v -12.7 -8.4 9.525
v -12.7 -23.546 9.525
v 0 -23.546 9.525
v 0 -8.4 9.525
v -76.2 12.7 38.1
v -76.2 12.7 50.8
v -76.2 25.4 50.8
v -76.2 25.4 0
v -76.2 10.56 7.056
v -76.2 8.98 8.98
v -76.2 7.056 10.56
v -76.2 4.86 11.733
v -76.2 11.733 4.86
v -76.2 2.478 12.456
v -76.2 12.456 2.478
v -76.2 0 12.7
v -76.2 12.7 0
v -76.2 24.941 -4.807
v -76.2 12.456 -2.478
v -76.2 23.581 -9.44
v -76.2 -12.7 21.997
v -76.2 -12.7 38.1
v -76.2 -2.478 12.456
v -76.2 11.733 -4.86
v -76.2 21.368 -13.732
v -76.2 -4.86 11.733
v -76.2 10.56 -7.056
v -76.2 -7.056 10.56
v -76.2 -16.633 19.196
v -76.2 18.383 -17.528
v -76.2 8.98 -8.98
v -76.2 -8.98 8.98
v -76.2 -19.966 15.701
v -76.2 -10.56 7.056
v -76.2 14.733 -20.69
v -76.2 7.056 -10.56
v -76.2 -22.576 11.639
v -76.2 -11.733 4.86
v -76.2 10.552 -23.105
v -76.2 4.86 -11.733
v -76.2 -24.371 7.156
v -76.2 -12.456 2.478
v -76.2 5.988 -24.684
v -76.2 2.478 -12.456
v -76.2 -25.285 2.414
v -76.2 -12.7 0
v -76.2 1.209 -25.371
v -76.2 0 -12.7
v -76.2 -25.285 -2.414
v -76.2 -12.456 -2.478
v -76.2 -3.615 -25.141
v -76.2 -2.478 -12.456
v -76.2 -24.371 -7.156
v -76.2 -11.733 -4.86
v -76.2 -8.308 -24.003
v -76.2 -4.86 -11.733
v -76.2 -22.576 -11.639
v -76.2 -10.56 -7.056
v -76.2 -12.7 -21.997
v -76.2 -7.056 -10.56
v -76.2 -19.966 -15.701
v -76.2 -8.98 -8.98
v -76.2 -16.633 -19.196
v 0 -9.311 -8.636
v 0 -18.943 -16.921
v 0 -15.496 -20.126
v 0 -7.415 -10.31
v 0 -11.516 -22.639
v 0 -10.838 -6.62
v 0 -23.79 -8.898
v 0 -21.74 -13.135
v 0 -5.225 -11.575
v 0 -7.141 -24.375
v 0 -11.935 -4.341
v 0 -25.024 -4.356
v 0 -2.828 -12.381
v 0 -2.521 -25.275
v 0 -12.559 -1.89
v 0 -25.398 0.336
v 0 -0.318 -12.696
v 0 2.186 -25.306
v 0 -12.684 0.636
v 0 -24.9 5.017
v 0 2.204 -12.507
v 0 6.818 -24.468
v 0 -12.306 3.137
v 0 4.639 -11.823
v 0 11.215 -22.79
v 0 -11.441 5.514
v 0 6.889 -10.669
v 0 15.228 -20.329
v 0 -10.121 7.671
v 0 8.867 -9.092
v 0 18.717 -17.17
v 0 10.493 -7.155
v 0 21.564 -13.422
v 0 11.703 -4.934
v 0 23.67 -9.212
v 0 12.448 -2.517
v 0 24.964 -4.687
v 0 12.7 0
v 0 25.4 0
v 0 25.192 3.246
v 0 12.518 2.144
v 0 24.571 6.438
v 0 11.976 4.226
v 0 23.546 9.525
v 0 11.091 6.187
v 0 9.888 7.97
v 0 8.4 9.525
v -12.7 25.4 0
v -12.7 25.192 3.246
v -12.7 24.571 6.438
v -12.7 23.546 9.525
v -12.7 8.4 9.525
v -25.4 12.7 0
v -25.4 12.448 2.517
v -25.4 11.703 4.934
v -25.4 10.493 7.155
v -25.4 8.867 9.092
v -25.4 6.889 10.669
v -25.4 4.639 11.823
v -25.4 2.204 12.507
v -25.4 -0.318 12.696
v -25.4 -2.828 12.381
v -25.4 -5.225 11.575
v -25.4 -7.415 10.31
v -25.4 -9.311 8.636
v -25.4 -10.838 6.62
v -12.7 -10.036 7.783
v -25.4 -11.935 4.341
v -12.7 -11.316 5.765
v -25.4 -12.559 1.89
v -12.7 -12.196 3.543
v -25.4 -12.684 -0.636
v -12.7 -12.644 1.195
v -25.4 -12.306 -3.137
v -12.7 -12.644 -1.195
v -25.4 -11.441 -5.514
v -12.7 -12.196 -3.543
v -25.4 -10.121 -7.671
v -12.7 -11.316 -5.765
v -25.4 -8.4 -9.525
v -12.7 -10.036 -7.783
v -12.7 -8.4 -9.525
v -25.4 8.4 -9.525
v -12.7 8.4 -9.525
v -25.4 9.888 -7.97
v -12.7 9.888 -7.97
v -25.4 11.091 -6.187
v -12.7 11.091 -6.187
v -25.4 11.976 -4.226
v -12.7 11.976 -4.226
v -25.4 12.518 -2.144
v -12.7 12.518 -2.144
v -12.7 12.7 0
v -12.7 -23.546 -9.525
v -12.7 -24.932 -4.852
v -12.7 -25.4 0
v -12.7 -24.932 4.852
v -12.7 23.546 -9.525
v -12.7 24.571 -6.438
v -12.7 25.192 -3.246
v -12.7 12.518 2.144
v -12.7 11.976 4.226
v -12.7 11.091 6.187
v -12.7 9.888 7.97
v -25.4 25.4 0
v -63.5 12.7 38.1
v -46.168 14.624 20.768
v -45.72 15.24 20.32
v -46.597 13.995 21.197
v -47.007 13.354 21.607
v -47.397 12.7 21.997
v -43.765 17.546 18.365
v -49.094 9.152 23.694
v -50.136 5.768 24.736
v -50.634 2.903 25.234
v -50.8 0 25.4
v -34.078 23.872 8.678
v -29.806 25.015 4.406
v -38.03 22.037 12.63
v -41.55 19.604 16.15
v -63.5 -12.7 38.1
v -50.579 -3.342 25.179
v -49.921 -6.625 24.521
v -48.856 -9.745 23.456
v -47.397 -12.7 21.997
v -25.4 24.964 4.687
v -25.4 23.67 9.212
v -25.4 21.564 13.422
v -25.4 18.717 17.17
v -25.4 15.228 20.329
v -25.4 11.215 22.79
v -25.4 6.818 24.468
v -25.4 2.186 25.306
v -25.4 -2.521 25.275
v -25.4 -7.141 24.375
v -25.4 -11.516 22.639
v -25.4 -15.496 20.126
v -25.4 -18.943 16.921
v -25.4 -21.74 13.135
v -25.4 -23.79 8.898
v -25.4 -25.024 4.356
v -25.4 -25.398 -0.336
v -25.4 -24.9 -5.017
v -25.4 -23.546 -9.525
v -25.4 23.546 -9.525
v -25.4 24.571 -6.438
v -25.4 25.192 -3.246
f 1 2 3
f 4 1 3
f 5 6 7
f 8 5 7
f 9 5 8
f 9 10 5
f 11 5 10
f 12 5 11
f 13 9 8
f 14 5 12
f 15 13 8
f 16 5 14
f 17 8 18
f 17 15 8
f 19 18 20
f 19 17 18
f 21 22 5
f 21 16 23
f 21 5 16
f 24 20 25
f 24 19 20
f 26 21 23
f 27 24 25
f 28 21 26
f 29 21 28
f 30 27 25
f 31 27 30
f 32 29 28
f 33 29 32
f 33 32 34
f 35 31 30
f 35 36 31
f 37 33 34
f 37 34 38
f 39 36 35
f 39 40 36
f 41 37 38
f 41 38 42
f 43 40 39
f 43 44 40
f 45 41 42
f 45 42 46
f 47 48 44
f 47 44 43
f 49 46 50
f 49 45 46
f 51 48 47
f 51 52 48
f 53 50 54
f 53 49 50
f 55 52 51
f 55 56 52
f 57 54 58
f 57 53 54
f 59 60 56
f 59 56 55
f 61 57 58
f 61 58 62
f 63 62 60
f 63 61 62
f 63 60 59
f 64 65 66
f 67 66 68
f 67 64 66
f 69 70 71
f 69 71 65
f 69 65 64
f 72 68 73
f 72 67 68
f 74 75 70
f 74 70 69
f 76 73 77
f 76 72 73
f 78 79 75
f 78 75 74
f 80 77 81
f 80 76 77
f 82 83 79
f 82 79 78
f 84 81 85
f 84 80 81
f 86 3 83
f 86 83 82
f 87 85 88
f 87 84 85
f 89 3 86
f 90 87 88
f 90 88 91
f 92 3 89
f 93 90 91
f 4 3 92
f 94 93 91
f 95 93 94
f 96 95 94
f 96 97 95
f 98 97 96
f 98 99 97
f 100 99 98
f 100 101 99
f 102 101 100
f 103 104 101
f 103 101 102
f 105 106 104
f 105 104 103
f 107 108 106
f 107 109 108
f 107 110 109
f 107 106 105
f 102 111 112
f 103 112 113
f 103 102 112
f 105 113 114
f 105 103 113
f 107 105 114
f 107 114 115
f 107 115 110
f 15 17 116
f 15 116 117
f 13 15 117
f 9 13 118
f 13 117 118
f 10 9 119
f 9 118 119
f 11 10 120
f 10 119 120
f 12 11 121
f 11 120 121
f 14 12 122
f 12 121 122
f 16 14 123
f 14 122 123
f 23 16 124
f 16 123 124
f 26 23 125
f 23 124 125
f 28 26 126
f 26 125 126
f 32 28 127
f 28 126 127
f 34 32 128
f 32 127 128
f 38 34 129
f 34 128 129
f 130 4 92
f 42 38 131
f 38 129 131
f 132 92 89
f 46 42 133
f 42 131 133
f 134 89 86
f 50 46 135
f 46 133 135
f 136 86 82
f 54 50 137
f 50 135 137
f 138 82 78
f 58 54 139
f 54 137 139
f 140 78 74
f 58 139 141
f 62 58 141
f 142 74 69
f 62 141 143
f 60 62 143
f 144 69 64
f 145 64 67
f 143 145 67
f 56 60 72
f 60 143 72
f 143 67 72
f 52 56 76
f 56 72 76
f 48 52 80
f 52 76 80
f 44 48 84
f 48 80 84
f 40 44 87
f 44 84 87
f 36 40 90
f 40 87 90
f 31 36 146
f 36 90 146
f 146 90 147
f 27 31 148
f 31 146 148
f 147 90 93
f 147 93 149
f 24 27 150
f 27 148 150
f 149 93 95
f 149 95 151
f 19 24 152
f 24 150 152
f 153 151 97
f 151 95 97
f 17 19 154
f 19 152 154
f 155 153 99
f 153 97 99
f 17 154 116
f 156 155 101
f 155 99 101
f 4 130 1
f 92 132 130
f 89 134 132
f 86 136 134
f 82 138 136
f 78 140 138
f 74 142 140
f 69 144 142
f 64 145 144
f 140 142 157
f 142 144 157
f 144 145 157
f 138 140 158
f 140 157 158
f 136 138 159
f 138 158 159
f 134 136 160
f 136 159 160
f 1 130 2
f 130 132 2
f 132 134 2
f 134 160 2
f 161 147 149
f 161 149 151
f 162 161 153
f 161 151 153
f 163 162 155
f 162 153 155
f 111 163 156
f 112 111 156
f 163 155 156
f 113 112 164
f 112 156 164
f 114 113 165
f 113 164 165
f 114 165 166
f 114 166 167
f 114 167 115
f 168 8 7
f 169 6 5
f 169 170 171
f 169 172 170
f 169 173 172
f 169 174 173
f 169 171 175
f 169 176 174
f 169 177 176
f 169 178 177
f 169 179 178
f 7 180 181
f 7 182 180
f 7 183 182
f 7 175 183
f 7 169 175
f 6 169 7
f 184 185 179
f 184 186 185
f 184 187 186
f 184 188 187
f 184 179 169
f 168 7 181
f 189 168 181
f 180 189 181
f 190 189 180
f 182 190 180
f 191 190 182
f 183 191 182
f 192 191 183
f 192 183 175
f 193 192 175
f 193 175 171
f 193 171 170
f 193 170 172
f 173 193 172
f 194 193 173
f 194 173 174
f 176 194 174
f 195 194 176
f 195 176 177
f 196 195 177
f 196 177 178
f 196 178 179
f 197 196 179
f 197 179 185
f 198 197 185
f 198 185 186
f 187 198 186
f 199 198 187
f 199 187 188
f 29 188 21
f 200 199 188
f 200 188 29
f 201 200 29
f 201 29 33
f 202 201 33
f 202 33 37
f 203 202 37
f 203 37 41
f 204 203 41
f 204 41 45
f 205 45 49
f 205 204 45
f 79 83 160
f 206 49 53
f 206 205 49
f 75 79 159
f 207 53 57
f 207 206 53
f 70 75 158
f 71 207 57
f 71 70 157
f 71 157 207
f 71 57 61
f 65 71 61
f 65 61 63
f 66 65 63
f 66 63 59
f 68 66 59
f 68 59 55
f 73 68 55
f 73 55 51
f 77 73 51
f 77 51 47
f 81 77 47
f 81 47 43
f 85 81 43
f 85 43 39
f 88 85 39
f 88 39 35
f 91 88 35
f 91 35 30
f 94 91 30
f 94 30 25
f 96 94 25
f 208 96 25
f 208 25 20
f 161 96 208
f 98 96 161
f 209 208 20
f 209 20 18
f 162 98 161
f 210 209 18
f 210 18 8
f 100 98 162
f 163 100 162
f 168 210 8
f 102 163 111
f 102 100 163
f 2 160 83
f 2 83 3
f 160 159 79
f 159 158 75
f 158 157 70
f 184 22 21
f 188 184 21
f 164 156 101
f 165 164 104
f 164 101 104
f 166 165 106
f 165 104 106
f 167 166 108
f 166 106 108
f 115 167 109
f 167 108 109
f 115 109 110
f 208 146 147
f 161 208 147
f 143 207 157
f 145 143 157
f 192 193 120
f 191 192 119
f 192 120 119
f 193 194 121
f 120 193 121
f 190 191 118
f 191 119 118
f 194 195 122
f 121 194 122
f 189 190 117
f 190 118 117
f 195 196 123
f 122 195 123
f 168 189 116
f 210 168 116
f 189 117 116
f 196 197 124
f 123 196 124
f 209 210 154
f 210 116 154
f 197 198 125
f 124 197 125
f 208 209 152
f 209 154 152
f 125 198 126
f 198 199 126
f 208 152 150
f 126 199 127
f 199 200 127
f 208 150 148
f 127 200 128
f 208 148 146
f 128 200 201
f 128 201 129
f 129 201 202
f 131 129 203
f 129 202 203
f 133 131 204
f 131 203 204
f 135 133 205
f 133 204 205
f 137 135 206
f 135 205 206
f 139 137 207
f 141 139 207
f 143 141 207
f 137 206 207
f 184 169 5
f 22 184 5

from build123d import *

# Parameters (mm, degrees)
F0_R     = 12.7
F1_DEPTH = 76.2
F3_DEPTH = 50.8
F4_DEPTH = 12.7
F5_DEPTH = 25.4
F6_DEPTH = 12.7
F7_DEPTH = 25.4
F8_DEPTH = 76.2


with BuildPart() as f1:
    # F0 (on Right) → F1 (new body)
    with BuildSketch(Plane.YZ):
        with BuildLine():
            ThreePointArc((-12.7, 21.9970452561), (-12.7, -21.9970452561), (25.4, 0))
            ThreePointArc((25.4, 0), (12.7, 21.9970452561), (-12.7, 21.9970452561))
        make_face()
        Circle(F0_R, mode=Mode.SUBTRACT)
    extrude(amount=-F1_DEPTH)

    # F2 (on Front) → F3 (cut, symmetric)
    with BuildSketch(Plane.XZ):
        Polygon((-12.7, 9.525), (0, 9.525), (0, 25.4), (0, 50.8), (-76.2, 50.8), (-63.5, 38.1), (-50.8, 25.4), (-25.4, 25.4), (-25.4, 0), (-25.4, -9.525), (-12.7, -9.525), align=None)
    extrude(amount=F3_DEPTH, both=True, mode=Mode.SUBTRACT)

    # F2 (on Front) → F4 (join, symmetric)
    with BuildSketch(Plane.XZ):
        Polygon((-76.2, 38.1), (-76.2, 20.32), (-45.72, 20.32), (-50.8, 25.4), (-63.5, 38.1), align=None)
    extrude(amount=F4_DEPTH, both=True)

    # F2 (on Front) → F5 (join)
    with BuildSketch(Plane.XZ):
        Polygon((-76.2, 50.8), (-76.2, 38.1), (-63.5, 38.1), align=None)
        Polygon((-76.2, 38.1), (-76.2, 20.32), (-45.72, 20.32), (-50.8, 25.4), (-63.5, 38.1), align=None)
    extrude(amount=-F5_DEPTH)

    # F6 (cut): a face of the model
    f6_faces = [f1.faces().sort_by_distance(p)[0] for p in [
        (-71.9666666667, 0, 42.3333333333),
    ]]
    extrude(f6_faces, amount=-F6_DEPTH, mode=Mode.SUBTRACT)

    # F2 (on Front) → F7 (join, through all)
    with BuildSketch(Plane.XZ):
        Polygon((-76.2, 20.32), (-76.2, 0), (-25.4, 0), (-45.72, 20.32), align=None)
    extrude(amount=-F7_DEPTH)

    # F0 (on Right) → F8 (cut, through all)
    with BuildSketch(Plane.YZ):
        Circle(F0_R)
    extrude(amount=-F8_DEPTH, mode=Mode.SUBTRACT)


solid = f1.part
